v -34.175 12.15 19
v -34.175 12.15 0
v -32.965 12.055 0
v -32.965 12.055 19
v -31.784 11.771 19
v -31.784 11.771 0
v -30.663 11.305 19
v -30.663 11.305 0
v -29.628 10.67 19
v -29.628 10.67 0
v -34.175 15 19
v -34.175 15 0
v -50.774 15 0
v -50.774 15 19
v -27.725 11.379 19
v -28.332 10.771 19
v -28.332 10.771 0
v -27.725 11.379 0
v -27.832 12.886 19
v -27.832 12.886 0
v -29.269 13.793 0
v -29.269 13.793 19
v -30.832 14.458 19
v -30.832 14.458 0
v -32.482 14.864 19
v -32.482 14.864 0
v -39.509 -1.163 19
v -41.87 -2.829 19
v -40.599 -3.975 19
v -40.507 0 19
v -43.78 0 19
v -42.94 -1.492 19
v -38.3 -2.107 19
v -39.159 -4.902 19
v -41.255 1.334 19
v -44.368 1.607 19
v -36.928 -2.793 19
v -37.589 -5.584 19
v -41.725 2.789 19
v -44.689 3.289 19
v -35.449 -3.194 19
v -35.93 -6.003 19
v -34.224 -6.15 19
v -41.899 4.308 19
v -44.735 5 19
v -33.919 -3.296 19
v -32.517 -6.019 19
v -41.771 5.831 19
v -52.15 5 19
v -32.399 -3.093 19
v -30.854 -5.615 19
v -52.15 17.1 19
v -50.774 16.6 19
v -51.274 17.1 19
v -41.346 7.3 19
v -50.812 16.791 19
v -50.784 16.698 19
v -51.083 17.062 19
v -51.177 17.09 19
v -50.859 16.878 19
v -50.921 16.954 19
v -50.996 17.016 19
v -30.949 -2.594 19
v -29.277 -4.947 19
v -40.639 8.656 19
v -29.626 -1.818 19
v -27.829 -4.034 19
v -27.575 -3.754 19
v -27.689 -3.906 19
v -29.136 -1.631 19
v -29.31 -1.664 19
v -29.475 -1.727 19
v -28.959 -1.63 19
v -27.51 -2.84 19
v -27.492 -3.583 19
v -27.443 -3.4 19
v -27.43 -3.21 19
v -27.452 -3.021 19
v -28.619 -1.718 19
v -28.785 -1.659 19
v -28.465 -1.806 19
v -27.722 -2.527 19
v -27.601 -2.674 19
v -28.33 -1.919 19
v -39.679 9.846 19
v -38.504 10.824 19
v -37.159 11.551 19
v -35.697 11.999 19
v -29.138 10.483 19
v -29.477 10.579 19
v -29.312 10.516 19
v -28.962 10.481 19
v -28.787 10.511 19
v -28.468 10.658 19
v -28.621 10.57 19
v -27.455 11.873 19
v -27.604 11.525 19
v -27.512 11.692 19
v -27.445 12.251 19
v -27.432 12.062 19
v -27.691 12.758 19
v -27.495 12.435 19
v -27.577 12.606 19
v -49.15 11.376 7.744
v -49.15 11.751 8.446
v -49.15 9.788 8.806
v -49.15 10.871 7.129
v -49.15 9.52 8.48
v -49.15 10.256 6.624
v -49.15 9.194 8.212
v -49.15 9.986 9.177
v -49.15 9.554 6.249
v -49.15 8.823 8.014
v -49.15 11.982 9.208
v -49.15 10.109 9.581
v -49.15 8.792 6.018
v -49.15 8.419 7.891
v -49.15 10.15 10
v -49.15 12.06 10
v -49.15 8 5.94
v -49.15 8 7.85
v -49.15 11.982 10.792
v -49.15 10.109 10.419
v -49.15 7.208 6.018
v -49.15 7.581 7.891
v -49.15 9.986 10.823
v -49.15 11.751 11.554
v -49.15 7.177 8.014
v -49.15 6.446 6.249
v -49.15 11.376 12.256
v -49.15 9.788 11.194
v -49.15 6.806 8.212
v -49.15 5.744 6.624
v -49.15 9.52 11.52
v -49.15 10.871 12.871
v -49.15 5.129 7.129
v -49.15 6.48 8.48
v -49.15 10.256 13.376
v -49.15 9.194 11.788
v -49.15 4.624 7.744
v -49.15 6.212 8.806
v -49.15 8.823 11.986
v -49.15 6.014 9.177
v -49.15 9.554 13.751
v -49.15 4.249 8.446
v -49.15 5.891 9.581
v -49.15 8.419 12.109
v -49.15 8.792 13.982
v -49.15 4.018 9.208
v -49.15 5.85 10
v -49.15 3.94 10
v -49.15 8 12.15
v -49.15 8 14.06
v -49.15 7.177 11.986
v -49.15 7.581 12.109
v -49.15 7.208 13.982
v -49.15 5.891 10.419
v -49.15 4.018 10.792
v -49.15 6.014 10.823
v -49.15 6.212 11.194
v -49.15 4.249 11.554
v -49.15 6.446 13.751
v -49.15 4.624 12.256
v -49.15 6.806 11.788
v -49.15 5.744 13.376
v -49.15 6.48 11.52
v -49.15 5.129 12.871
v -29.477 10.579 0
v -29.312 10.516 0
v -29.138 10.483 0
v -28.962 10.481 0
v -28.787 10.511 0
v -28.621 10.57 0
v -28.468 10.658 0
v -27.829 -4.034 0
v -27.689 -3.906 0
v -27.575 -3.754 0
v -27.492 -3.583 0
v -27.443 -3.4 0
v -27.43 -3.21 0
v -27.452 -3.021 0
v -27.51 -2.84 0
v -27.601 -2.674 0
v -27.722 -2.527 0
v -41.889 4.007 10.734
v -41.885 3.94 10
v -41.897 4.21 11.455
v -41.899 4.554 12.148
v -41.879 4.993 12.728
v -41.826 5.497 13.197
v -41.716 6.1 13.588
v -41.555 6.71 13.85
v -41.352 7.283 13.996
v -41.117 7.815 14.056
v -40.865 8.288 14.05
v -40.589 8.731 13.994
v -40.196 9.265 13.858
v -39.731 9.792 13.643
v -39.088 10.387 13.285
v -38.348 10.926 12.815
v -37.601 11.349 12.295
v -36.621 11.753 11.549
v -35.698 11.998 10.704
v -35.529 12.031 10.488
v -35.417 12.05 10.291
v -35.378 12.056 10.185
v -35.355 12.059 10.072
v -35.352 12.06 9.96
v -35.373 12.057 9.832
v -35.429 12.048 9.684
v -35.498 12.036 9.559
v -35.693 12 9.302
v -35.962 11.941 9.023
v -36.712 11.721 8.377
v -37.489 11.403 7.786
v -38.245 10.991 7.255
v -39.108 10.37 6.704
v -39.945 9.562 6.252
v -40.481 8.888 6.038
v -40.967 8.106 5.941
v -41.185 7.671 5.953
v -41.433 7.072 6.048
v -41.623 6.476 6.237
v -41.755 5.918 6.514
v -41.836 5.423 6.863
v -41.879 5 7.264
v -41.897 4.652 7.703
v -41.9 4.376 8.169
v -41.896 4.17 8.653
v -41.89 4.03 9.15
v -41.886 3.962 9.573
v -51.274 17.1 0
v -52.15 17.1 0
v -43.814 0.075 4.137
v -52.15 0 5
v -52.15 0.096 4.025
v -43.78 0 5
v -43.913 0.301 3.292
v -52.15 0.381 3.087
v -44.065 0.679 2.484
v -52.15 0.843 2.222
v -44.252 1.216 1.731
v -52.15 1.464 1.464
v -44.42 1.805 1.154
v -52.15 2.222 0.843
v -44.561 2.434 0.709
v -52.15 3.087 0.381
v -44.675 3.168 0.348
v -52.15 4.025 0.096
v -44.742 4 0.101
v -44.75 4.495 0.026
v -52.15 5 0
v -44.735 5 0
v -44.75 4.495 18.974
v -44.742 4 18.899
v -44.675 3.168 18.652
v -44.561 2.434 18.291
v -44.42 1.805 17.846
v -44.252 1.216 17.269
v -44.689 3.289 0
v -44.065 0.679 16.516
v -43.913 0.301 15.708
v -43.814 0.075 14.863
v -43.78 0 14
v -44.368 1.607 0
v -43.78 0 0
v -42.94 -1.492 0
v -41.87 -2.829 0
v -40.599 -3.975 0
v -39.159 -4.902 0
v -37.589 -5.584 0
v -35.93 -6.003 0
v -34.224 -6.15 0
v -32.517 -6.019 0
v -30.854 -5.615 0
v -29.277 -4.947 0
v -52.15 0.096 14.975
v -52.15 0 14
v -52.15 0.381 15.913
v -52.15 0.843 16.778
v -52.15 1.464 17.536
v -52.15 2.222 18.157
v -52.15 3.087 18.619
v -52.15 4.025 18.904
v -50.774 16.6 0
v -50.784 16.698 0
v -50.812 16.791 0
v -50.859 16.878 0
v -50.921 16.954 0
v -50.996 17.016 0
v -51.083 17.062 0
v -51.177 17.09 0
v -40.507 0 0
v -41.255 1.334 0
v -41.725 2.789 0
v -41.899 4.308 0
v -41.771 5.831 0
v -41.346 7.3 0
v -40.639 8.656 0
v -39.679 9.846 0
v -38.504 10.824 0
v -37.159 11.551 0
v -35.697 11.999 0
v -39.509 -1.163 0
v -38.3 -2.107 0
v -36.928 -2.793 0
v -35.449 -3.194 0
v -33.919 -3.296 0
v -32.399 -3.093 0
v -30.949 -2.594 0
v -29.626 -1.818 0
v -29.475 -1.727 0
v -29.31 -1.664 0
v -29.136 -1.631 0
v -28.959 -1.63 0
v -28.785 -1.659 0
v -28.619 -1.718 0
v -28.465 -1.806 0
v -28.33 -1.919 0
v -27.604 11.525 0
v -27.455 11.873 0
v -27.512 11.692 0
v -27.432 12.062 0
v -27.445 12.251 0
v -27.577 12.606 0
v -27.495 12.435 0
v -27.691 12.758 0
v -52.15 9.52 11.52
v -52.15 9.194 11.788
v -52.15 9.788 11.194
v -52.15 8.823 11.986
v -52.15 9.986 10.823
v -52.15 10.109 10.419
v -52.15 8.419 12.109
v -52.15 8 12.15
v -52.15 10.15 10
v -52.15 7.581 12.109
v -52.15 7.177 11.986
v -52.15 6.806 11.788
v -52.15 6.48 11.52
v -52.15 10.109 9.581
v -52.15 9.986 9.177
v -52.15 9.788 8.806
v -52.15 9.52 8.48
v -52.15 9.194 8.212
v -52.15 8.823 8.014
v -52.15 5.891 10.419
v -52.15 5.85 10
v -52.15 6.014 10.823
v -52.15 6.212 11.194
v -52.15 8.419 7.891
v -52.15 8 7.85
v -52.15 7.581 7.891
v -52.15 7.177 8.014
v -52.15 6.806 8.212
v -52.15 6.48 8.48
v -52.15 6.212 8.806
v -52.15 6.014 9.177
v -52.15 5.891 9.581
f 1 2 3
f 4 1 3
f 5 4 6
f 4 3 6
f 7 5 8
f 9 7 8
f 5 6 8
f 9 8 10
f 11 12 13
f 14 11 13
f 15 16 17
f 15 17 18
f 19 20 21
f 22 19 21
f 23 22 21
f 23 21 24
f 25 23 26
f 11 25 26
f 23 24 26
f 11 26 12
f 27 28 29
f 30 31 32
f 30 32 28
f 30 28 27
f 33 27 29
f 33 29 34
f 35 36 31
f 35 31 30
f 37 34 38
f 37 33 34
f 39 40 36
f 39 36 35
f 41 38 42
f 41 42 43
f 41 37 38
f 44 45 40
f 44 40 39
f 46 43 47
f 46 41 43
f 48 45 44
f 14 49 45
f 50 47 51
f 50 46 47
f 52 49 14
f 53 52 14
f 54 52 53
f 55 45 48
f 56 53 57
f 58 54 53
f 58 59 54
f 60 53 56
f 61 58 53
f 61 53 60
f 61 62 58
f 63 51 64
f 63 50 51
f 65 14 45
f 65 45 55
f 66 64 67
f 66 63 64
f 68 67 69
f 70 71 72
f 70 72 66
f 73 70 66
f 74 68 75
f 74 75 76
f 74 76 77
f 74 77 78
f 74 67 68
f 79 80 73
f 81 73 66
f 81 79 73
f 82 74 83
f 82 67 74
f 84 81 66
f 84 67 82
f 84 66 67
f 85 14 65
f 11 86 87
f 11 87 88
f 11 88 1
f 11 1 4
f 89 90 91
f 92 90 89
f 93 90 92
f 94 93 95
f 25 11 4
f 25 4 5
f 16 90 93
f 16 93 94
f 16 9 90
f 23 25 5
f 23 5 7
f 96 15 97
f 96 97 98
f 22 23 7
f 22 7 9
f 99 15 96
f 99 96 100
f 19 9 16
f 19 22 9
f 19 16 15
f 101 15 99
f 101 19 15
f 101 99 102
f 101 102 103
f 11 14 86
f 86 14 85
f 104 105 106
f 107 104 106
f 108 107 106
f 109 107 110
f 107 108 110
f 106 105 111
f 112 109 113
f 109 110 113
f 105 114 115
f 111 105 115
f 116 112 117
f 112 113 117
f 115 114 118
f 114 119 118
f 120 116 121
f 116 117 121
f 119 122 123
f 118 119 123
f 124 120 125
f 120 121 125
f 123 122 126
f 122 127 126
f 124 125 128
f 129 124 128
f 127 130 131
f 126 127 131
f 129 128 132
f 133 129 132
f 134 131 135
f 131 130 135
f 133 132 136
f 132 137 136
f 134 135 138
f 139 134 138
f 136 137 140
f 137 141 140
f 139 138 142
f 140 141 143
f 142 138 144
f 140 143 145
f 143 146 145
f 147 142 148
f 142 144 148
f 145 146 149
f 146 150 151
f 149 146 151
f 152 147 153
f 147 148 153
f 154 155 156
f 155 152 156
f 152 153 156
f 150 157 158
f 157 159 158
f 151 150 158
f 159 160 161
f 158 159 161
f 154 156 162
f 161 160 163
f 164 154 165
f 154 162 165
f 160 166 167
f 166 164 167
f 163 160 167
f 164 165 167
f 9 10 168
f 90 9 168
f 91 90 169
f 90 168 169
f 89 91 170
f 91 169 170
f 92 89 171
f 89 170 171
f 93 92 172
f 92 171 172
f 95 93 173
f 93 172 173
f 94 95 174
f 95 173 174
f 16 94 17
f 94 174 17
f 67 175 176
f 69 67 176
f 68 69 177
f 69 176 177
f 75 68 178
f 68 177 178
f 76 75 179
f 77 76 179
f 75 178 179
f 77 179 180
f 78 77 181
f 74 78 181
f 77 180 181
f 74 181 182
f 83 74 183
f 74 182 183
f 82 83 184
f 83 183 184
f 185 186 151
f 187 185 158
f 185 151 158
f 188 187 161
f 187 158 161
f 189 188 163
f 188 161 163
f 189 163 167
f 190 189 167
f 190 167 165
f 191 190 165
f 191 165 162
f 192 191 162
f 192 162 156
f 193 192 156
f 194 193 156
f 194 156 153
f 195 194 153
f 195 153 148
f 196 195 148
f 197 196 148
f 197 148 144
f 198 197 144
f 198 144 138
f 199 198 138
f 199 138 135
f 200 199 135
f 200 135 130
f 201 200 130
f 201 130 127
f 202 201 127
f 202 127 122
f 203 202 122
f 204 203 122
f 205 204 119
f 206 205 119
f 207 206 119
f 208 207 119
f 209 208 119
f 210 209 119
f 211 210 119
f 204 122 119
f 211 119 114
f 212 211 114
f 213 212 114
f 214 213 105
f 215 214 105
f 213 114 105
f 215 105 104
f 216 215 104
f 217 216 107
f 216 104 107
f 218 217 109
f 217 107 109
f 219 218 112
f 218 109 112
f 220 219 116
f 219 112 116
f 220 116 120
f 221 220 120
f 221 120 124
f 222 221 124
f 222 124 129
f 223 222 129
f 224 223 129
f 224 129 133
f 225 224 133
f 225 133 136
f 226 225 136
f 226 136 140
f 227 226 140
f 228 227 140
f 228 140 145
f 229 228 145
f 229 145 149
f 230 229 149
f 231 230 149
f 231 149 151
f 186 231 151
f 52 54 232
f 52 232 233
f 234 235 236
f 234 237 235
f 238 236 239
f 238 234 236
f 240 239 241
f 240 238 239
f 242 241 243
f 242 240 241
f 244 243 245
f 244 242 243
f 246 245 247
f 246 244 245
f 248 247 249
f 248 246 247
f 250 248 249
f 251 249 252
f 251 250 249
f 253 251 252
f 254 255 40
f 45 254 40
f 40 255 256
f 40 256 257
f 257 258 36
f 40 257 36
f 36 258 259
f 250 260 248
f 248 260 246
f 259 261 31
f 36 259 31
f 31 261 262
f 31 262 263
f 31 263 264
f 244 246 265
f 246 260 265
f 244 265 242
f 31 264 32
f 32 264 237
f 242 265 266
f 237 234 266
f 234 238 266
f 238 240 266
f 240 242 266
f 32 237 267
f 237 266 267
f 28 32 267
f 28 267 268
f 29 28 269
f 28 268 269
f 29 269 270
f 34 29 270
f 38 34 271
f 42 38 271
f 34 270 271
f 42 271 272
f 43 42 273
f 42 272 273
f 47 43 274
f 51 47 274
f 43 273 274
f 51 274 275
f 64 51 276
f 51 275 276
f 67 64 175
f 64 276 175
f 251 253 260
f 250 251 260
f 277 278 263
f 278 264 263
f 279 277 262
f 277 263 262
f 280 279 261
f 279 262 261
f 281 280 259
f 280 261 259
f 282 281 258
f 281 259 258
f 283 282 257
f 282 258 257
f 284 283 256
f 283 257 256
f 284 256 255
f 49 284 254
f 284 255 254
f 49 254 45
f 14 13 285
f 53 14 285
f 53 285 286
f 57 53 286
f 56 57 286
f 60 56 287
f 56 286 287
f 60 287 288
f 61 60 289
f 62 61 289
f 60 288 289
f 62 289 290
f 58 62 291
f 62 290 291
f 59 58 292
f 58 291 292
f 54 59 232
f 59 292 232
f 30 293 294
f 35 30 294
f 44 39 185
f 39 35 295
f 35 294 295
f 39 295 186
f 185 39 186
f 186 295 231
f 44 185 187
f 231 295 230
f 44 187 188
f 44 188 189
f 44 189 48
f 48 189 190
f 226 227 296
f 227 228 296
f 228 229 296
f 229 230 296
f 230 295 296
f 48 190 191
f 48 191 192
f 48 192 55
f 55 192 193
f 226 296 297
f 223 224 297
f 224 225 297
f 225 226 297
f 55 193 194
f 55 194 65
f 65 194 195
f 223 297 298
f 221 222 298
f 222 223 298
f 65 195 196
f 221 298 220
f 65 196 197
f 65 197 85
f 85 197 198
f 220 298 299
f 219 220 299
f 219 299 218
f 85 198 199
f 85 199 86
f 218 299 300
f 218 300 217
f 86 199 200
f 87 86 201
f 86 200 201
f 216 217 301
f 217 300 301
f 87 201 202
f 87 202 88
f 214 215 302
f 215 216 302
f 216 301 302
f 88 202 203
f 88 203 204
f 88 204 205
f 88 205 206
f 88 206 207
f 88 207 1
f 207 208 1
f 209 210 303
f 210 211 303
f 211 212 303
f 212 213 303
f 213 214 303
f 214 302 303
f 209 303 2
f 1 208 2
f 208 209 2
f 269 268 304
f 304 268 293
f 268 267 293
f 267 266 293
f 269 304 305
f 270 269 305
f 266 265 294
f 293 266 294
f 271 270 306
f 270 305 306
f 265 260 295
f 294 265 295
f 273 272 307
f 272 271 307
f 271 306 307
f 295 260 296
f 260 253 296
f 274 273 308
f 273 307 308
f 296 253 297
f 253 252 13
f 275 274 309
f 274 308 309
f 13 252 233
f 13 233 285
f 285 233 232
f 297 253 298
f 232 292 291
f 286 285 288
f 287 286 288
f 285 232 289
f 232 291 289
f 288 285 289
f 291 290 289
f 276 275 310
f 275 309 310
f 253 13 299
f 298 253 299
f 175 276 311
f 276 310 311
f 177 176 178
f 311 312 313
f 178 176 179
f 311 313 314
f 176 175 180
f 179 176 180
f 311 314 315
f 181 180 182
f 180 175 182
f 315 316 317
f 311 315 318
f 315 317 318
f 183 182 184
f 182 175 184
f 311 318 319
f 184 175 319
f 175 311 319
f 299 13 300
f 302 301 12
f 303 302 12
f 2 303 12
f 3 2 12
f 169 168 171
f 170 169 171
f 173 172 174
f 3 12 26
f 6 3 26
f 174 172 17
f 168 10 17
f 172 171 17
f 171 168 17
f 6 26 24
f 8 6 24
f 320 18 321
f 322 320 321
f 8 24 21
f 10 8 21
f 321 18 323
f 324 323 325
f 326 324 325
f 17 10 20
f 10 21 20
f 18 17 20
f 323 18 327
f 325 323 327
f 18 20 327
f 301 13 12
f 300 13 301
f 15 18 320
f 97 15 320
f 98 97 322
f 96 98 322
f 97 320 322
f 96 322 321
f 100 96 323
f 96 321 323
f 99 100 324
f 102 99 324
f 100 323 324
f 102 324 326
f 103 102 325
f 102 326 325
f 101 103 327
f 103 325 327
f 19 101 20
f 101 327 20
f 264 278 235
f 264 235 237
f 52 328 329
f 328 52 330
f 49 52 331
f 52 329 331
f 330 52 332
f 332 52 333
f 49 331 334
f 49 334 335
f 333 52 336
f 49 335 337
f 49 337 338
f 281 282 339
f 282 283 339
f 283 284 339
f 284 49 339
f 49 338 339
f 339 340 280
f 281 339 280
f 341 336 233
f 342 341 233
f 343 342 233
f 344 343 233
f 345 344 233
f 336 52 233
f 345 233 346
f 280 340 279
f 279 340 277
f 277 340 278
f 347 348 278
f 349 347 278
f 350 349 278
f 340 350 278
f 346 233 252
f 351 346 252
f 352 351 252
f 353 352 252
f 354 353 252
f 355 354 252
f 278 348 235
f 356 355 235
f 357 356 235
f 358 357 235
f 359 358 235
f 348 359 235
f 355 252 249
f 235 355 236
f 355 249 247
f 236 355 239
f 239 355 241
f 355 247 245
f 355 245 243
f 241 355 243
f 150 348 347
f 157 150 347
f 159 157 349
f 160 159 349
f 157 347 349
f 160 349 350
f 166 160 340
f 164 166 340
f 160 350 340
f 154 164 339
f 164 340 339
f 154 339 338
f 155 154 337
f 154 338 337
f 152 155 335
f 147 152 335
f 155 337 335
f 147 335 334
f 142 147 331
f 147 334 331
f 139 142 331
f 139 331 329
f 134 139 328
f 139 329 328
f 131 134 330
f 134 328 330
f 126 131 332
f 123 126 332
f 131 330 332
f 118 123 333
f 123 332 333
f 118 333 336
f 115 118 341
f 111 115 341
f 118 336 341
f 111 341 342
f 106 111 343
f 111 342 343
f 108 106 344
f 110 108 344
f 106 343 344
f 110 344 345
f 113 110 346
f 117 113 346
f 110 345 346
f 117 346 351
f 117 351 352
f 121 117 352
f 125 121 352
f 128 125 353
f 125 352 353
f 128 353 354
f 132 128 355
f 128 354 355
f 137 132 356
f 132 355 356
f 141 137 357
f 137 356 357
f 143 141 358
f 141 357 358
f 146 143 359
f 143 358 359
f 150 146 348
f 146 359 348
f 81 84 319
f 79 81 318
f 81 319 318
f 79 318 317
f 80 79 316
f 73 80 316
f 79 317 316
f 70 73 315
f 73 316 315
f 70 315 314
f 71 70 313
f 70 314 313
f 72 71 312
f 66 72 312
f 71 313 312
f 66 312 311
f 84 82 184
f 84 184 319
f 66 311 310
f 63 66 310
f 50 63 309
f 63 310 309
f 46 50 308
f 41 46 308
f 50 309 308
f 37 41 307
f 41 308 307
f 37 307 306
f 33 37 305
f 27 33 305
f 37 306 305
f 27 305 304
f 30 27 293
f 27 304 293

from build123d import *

# Parameters (mm, degrees)
F0_W     = 1.376042
F0_H     = 15
F1_DEPTH = 19
F2_R     = 5
F3_R     = 4.06
F4_DEPTH = 17
F5_R     = 4.15
F5_R_2   = 2.15
F6_DEPTH = 3


with BuildPart() as f1:
    # F0 (on Top) → F1 (new body)
    with BuildSketch(Plane.XY):
        with BuildLine():
            ThreePointArc((-27.724563, 11.37891), (-27.434191, 12.156994), (-27.831811, 12.886122))
            ThreePointArc((-27.831811, 12.886122), (-30.832093, 14.457622), (-34.175314, 15))
            Line((-34.175314, 15), (-34.175314, 12.15))
            ThreePointArc((-34.175314, 12.15), (-31.784278, 11.77065), (-29.628073, 10.669856))
            ThreePointArc((-29.628073, 10.669856), (-28.961501, 10.481293), (-28.332327, 10.771145))
            Line((-28.332327, 10.771145), (-27.724563, 11.37891))
        make_face()
        with BuildLine():
            Line((-34.175314, 12.15), (-34.175314, 15))
            ThreePointArc((-34.175314, 15), (-43.081071, 10.127467), (-43.78, 0))
            Line((-43.78, 0), (-40.507375, 0))
            ThreePointArc((-40.507375, 0), (-41.025816, 7.995189), (-34.175314, 12.15))
        make_face()
        with BuildLine():
            ThreePointArc((-43.78, 0), (-43.081071, 10.127467), (-34.175314, 15))
            Line((-34.175314, 15), (-50.774272, 15))
            Line((-50.774272, 15), (-50.774272, 0))
            Line((-50.774272, 0), (-43.78, 0))
        make_face()
        with BuildLine():
            Line((-40.507375, 0), (-43.78, 0))
            ThreePointArc((-43.78, 0), (-36.768247, -5.827186), (-27.829234, -4.03419))
            ThreePointArc((-27.829234, -4.03419), (-27.431848, -3.305092), (-27.72223, -2.52716))
            Line((-27.72223, -2.52716), (-28.329965, -1.919425))
            ThreePointArc((-28.329965, -1.919425), (-28.959306, -1.62956), (-29.625982, -1.818333))
            ThreePointArc((-29.625982, -1.818333), (-35.448544, -3.194351), (-40.507375, 0))
        make_face()
        with Locations((-51.462293, 7.5)):
            Rectangle(F0_W, F0_H)
        with BuildLine():
            Line((-52.150314, 15), (-50.774272, 15))
            Line((-50.774272, 15), (-50.774272, 16.6))
            ThreePointArc((-50.774272, 16.6), (-50.920718, 16.953553), (-51.274272, 17.1))
            Line((-51.274272, 17.1), (-52.150314, 17.1))
            Line((-52.150314, 17.1), (-52.150314, 15))
        make_face()
    extrude(amount=F1_DEPTH)

    # F2
    f2_edges = [f1.edges().sort_by_distance(p)[0] for p in [
        (-47.965157, 0, 19),
        (-47.965157, 0, 0),
    ]]
    fillet(f2_edges, radius=F2_R)

    # F3 (on face) → F4 (cut)
    with BuildSketch(Plane(origin=(-52.150314, 0, 0), x_dir=(0, -1, 0), z_dir=(-1, 0, 0))):
        with Locations((-8, 10)):
            Circle(F3_R)
    extrude(amount=-F4_DEPTH, mode=Mode.SUBTRACT)

    # F5 (on face) → F6 (join)
    with BuildSketch(Plane(origin=(-52.150314, 0, 0), x_dir=(0, -1, 0), z_dir=(-1, 0, 0))):
        with Locations((-8, 10)):
            Circle(F5_R)
        with Locations((-8, 10)):
            Circle(F5_R_2, mode=Mode.SUBTRACT)
    extrude(amount=-F6_DEPTH)


solid = f1.part
